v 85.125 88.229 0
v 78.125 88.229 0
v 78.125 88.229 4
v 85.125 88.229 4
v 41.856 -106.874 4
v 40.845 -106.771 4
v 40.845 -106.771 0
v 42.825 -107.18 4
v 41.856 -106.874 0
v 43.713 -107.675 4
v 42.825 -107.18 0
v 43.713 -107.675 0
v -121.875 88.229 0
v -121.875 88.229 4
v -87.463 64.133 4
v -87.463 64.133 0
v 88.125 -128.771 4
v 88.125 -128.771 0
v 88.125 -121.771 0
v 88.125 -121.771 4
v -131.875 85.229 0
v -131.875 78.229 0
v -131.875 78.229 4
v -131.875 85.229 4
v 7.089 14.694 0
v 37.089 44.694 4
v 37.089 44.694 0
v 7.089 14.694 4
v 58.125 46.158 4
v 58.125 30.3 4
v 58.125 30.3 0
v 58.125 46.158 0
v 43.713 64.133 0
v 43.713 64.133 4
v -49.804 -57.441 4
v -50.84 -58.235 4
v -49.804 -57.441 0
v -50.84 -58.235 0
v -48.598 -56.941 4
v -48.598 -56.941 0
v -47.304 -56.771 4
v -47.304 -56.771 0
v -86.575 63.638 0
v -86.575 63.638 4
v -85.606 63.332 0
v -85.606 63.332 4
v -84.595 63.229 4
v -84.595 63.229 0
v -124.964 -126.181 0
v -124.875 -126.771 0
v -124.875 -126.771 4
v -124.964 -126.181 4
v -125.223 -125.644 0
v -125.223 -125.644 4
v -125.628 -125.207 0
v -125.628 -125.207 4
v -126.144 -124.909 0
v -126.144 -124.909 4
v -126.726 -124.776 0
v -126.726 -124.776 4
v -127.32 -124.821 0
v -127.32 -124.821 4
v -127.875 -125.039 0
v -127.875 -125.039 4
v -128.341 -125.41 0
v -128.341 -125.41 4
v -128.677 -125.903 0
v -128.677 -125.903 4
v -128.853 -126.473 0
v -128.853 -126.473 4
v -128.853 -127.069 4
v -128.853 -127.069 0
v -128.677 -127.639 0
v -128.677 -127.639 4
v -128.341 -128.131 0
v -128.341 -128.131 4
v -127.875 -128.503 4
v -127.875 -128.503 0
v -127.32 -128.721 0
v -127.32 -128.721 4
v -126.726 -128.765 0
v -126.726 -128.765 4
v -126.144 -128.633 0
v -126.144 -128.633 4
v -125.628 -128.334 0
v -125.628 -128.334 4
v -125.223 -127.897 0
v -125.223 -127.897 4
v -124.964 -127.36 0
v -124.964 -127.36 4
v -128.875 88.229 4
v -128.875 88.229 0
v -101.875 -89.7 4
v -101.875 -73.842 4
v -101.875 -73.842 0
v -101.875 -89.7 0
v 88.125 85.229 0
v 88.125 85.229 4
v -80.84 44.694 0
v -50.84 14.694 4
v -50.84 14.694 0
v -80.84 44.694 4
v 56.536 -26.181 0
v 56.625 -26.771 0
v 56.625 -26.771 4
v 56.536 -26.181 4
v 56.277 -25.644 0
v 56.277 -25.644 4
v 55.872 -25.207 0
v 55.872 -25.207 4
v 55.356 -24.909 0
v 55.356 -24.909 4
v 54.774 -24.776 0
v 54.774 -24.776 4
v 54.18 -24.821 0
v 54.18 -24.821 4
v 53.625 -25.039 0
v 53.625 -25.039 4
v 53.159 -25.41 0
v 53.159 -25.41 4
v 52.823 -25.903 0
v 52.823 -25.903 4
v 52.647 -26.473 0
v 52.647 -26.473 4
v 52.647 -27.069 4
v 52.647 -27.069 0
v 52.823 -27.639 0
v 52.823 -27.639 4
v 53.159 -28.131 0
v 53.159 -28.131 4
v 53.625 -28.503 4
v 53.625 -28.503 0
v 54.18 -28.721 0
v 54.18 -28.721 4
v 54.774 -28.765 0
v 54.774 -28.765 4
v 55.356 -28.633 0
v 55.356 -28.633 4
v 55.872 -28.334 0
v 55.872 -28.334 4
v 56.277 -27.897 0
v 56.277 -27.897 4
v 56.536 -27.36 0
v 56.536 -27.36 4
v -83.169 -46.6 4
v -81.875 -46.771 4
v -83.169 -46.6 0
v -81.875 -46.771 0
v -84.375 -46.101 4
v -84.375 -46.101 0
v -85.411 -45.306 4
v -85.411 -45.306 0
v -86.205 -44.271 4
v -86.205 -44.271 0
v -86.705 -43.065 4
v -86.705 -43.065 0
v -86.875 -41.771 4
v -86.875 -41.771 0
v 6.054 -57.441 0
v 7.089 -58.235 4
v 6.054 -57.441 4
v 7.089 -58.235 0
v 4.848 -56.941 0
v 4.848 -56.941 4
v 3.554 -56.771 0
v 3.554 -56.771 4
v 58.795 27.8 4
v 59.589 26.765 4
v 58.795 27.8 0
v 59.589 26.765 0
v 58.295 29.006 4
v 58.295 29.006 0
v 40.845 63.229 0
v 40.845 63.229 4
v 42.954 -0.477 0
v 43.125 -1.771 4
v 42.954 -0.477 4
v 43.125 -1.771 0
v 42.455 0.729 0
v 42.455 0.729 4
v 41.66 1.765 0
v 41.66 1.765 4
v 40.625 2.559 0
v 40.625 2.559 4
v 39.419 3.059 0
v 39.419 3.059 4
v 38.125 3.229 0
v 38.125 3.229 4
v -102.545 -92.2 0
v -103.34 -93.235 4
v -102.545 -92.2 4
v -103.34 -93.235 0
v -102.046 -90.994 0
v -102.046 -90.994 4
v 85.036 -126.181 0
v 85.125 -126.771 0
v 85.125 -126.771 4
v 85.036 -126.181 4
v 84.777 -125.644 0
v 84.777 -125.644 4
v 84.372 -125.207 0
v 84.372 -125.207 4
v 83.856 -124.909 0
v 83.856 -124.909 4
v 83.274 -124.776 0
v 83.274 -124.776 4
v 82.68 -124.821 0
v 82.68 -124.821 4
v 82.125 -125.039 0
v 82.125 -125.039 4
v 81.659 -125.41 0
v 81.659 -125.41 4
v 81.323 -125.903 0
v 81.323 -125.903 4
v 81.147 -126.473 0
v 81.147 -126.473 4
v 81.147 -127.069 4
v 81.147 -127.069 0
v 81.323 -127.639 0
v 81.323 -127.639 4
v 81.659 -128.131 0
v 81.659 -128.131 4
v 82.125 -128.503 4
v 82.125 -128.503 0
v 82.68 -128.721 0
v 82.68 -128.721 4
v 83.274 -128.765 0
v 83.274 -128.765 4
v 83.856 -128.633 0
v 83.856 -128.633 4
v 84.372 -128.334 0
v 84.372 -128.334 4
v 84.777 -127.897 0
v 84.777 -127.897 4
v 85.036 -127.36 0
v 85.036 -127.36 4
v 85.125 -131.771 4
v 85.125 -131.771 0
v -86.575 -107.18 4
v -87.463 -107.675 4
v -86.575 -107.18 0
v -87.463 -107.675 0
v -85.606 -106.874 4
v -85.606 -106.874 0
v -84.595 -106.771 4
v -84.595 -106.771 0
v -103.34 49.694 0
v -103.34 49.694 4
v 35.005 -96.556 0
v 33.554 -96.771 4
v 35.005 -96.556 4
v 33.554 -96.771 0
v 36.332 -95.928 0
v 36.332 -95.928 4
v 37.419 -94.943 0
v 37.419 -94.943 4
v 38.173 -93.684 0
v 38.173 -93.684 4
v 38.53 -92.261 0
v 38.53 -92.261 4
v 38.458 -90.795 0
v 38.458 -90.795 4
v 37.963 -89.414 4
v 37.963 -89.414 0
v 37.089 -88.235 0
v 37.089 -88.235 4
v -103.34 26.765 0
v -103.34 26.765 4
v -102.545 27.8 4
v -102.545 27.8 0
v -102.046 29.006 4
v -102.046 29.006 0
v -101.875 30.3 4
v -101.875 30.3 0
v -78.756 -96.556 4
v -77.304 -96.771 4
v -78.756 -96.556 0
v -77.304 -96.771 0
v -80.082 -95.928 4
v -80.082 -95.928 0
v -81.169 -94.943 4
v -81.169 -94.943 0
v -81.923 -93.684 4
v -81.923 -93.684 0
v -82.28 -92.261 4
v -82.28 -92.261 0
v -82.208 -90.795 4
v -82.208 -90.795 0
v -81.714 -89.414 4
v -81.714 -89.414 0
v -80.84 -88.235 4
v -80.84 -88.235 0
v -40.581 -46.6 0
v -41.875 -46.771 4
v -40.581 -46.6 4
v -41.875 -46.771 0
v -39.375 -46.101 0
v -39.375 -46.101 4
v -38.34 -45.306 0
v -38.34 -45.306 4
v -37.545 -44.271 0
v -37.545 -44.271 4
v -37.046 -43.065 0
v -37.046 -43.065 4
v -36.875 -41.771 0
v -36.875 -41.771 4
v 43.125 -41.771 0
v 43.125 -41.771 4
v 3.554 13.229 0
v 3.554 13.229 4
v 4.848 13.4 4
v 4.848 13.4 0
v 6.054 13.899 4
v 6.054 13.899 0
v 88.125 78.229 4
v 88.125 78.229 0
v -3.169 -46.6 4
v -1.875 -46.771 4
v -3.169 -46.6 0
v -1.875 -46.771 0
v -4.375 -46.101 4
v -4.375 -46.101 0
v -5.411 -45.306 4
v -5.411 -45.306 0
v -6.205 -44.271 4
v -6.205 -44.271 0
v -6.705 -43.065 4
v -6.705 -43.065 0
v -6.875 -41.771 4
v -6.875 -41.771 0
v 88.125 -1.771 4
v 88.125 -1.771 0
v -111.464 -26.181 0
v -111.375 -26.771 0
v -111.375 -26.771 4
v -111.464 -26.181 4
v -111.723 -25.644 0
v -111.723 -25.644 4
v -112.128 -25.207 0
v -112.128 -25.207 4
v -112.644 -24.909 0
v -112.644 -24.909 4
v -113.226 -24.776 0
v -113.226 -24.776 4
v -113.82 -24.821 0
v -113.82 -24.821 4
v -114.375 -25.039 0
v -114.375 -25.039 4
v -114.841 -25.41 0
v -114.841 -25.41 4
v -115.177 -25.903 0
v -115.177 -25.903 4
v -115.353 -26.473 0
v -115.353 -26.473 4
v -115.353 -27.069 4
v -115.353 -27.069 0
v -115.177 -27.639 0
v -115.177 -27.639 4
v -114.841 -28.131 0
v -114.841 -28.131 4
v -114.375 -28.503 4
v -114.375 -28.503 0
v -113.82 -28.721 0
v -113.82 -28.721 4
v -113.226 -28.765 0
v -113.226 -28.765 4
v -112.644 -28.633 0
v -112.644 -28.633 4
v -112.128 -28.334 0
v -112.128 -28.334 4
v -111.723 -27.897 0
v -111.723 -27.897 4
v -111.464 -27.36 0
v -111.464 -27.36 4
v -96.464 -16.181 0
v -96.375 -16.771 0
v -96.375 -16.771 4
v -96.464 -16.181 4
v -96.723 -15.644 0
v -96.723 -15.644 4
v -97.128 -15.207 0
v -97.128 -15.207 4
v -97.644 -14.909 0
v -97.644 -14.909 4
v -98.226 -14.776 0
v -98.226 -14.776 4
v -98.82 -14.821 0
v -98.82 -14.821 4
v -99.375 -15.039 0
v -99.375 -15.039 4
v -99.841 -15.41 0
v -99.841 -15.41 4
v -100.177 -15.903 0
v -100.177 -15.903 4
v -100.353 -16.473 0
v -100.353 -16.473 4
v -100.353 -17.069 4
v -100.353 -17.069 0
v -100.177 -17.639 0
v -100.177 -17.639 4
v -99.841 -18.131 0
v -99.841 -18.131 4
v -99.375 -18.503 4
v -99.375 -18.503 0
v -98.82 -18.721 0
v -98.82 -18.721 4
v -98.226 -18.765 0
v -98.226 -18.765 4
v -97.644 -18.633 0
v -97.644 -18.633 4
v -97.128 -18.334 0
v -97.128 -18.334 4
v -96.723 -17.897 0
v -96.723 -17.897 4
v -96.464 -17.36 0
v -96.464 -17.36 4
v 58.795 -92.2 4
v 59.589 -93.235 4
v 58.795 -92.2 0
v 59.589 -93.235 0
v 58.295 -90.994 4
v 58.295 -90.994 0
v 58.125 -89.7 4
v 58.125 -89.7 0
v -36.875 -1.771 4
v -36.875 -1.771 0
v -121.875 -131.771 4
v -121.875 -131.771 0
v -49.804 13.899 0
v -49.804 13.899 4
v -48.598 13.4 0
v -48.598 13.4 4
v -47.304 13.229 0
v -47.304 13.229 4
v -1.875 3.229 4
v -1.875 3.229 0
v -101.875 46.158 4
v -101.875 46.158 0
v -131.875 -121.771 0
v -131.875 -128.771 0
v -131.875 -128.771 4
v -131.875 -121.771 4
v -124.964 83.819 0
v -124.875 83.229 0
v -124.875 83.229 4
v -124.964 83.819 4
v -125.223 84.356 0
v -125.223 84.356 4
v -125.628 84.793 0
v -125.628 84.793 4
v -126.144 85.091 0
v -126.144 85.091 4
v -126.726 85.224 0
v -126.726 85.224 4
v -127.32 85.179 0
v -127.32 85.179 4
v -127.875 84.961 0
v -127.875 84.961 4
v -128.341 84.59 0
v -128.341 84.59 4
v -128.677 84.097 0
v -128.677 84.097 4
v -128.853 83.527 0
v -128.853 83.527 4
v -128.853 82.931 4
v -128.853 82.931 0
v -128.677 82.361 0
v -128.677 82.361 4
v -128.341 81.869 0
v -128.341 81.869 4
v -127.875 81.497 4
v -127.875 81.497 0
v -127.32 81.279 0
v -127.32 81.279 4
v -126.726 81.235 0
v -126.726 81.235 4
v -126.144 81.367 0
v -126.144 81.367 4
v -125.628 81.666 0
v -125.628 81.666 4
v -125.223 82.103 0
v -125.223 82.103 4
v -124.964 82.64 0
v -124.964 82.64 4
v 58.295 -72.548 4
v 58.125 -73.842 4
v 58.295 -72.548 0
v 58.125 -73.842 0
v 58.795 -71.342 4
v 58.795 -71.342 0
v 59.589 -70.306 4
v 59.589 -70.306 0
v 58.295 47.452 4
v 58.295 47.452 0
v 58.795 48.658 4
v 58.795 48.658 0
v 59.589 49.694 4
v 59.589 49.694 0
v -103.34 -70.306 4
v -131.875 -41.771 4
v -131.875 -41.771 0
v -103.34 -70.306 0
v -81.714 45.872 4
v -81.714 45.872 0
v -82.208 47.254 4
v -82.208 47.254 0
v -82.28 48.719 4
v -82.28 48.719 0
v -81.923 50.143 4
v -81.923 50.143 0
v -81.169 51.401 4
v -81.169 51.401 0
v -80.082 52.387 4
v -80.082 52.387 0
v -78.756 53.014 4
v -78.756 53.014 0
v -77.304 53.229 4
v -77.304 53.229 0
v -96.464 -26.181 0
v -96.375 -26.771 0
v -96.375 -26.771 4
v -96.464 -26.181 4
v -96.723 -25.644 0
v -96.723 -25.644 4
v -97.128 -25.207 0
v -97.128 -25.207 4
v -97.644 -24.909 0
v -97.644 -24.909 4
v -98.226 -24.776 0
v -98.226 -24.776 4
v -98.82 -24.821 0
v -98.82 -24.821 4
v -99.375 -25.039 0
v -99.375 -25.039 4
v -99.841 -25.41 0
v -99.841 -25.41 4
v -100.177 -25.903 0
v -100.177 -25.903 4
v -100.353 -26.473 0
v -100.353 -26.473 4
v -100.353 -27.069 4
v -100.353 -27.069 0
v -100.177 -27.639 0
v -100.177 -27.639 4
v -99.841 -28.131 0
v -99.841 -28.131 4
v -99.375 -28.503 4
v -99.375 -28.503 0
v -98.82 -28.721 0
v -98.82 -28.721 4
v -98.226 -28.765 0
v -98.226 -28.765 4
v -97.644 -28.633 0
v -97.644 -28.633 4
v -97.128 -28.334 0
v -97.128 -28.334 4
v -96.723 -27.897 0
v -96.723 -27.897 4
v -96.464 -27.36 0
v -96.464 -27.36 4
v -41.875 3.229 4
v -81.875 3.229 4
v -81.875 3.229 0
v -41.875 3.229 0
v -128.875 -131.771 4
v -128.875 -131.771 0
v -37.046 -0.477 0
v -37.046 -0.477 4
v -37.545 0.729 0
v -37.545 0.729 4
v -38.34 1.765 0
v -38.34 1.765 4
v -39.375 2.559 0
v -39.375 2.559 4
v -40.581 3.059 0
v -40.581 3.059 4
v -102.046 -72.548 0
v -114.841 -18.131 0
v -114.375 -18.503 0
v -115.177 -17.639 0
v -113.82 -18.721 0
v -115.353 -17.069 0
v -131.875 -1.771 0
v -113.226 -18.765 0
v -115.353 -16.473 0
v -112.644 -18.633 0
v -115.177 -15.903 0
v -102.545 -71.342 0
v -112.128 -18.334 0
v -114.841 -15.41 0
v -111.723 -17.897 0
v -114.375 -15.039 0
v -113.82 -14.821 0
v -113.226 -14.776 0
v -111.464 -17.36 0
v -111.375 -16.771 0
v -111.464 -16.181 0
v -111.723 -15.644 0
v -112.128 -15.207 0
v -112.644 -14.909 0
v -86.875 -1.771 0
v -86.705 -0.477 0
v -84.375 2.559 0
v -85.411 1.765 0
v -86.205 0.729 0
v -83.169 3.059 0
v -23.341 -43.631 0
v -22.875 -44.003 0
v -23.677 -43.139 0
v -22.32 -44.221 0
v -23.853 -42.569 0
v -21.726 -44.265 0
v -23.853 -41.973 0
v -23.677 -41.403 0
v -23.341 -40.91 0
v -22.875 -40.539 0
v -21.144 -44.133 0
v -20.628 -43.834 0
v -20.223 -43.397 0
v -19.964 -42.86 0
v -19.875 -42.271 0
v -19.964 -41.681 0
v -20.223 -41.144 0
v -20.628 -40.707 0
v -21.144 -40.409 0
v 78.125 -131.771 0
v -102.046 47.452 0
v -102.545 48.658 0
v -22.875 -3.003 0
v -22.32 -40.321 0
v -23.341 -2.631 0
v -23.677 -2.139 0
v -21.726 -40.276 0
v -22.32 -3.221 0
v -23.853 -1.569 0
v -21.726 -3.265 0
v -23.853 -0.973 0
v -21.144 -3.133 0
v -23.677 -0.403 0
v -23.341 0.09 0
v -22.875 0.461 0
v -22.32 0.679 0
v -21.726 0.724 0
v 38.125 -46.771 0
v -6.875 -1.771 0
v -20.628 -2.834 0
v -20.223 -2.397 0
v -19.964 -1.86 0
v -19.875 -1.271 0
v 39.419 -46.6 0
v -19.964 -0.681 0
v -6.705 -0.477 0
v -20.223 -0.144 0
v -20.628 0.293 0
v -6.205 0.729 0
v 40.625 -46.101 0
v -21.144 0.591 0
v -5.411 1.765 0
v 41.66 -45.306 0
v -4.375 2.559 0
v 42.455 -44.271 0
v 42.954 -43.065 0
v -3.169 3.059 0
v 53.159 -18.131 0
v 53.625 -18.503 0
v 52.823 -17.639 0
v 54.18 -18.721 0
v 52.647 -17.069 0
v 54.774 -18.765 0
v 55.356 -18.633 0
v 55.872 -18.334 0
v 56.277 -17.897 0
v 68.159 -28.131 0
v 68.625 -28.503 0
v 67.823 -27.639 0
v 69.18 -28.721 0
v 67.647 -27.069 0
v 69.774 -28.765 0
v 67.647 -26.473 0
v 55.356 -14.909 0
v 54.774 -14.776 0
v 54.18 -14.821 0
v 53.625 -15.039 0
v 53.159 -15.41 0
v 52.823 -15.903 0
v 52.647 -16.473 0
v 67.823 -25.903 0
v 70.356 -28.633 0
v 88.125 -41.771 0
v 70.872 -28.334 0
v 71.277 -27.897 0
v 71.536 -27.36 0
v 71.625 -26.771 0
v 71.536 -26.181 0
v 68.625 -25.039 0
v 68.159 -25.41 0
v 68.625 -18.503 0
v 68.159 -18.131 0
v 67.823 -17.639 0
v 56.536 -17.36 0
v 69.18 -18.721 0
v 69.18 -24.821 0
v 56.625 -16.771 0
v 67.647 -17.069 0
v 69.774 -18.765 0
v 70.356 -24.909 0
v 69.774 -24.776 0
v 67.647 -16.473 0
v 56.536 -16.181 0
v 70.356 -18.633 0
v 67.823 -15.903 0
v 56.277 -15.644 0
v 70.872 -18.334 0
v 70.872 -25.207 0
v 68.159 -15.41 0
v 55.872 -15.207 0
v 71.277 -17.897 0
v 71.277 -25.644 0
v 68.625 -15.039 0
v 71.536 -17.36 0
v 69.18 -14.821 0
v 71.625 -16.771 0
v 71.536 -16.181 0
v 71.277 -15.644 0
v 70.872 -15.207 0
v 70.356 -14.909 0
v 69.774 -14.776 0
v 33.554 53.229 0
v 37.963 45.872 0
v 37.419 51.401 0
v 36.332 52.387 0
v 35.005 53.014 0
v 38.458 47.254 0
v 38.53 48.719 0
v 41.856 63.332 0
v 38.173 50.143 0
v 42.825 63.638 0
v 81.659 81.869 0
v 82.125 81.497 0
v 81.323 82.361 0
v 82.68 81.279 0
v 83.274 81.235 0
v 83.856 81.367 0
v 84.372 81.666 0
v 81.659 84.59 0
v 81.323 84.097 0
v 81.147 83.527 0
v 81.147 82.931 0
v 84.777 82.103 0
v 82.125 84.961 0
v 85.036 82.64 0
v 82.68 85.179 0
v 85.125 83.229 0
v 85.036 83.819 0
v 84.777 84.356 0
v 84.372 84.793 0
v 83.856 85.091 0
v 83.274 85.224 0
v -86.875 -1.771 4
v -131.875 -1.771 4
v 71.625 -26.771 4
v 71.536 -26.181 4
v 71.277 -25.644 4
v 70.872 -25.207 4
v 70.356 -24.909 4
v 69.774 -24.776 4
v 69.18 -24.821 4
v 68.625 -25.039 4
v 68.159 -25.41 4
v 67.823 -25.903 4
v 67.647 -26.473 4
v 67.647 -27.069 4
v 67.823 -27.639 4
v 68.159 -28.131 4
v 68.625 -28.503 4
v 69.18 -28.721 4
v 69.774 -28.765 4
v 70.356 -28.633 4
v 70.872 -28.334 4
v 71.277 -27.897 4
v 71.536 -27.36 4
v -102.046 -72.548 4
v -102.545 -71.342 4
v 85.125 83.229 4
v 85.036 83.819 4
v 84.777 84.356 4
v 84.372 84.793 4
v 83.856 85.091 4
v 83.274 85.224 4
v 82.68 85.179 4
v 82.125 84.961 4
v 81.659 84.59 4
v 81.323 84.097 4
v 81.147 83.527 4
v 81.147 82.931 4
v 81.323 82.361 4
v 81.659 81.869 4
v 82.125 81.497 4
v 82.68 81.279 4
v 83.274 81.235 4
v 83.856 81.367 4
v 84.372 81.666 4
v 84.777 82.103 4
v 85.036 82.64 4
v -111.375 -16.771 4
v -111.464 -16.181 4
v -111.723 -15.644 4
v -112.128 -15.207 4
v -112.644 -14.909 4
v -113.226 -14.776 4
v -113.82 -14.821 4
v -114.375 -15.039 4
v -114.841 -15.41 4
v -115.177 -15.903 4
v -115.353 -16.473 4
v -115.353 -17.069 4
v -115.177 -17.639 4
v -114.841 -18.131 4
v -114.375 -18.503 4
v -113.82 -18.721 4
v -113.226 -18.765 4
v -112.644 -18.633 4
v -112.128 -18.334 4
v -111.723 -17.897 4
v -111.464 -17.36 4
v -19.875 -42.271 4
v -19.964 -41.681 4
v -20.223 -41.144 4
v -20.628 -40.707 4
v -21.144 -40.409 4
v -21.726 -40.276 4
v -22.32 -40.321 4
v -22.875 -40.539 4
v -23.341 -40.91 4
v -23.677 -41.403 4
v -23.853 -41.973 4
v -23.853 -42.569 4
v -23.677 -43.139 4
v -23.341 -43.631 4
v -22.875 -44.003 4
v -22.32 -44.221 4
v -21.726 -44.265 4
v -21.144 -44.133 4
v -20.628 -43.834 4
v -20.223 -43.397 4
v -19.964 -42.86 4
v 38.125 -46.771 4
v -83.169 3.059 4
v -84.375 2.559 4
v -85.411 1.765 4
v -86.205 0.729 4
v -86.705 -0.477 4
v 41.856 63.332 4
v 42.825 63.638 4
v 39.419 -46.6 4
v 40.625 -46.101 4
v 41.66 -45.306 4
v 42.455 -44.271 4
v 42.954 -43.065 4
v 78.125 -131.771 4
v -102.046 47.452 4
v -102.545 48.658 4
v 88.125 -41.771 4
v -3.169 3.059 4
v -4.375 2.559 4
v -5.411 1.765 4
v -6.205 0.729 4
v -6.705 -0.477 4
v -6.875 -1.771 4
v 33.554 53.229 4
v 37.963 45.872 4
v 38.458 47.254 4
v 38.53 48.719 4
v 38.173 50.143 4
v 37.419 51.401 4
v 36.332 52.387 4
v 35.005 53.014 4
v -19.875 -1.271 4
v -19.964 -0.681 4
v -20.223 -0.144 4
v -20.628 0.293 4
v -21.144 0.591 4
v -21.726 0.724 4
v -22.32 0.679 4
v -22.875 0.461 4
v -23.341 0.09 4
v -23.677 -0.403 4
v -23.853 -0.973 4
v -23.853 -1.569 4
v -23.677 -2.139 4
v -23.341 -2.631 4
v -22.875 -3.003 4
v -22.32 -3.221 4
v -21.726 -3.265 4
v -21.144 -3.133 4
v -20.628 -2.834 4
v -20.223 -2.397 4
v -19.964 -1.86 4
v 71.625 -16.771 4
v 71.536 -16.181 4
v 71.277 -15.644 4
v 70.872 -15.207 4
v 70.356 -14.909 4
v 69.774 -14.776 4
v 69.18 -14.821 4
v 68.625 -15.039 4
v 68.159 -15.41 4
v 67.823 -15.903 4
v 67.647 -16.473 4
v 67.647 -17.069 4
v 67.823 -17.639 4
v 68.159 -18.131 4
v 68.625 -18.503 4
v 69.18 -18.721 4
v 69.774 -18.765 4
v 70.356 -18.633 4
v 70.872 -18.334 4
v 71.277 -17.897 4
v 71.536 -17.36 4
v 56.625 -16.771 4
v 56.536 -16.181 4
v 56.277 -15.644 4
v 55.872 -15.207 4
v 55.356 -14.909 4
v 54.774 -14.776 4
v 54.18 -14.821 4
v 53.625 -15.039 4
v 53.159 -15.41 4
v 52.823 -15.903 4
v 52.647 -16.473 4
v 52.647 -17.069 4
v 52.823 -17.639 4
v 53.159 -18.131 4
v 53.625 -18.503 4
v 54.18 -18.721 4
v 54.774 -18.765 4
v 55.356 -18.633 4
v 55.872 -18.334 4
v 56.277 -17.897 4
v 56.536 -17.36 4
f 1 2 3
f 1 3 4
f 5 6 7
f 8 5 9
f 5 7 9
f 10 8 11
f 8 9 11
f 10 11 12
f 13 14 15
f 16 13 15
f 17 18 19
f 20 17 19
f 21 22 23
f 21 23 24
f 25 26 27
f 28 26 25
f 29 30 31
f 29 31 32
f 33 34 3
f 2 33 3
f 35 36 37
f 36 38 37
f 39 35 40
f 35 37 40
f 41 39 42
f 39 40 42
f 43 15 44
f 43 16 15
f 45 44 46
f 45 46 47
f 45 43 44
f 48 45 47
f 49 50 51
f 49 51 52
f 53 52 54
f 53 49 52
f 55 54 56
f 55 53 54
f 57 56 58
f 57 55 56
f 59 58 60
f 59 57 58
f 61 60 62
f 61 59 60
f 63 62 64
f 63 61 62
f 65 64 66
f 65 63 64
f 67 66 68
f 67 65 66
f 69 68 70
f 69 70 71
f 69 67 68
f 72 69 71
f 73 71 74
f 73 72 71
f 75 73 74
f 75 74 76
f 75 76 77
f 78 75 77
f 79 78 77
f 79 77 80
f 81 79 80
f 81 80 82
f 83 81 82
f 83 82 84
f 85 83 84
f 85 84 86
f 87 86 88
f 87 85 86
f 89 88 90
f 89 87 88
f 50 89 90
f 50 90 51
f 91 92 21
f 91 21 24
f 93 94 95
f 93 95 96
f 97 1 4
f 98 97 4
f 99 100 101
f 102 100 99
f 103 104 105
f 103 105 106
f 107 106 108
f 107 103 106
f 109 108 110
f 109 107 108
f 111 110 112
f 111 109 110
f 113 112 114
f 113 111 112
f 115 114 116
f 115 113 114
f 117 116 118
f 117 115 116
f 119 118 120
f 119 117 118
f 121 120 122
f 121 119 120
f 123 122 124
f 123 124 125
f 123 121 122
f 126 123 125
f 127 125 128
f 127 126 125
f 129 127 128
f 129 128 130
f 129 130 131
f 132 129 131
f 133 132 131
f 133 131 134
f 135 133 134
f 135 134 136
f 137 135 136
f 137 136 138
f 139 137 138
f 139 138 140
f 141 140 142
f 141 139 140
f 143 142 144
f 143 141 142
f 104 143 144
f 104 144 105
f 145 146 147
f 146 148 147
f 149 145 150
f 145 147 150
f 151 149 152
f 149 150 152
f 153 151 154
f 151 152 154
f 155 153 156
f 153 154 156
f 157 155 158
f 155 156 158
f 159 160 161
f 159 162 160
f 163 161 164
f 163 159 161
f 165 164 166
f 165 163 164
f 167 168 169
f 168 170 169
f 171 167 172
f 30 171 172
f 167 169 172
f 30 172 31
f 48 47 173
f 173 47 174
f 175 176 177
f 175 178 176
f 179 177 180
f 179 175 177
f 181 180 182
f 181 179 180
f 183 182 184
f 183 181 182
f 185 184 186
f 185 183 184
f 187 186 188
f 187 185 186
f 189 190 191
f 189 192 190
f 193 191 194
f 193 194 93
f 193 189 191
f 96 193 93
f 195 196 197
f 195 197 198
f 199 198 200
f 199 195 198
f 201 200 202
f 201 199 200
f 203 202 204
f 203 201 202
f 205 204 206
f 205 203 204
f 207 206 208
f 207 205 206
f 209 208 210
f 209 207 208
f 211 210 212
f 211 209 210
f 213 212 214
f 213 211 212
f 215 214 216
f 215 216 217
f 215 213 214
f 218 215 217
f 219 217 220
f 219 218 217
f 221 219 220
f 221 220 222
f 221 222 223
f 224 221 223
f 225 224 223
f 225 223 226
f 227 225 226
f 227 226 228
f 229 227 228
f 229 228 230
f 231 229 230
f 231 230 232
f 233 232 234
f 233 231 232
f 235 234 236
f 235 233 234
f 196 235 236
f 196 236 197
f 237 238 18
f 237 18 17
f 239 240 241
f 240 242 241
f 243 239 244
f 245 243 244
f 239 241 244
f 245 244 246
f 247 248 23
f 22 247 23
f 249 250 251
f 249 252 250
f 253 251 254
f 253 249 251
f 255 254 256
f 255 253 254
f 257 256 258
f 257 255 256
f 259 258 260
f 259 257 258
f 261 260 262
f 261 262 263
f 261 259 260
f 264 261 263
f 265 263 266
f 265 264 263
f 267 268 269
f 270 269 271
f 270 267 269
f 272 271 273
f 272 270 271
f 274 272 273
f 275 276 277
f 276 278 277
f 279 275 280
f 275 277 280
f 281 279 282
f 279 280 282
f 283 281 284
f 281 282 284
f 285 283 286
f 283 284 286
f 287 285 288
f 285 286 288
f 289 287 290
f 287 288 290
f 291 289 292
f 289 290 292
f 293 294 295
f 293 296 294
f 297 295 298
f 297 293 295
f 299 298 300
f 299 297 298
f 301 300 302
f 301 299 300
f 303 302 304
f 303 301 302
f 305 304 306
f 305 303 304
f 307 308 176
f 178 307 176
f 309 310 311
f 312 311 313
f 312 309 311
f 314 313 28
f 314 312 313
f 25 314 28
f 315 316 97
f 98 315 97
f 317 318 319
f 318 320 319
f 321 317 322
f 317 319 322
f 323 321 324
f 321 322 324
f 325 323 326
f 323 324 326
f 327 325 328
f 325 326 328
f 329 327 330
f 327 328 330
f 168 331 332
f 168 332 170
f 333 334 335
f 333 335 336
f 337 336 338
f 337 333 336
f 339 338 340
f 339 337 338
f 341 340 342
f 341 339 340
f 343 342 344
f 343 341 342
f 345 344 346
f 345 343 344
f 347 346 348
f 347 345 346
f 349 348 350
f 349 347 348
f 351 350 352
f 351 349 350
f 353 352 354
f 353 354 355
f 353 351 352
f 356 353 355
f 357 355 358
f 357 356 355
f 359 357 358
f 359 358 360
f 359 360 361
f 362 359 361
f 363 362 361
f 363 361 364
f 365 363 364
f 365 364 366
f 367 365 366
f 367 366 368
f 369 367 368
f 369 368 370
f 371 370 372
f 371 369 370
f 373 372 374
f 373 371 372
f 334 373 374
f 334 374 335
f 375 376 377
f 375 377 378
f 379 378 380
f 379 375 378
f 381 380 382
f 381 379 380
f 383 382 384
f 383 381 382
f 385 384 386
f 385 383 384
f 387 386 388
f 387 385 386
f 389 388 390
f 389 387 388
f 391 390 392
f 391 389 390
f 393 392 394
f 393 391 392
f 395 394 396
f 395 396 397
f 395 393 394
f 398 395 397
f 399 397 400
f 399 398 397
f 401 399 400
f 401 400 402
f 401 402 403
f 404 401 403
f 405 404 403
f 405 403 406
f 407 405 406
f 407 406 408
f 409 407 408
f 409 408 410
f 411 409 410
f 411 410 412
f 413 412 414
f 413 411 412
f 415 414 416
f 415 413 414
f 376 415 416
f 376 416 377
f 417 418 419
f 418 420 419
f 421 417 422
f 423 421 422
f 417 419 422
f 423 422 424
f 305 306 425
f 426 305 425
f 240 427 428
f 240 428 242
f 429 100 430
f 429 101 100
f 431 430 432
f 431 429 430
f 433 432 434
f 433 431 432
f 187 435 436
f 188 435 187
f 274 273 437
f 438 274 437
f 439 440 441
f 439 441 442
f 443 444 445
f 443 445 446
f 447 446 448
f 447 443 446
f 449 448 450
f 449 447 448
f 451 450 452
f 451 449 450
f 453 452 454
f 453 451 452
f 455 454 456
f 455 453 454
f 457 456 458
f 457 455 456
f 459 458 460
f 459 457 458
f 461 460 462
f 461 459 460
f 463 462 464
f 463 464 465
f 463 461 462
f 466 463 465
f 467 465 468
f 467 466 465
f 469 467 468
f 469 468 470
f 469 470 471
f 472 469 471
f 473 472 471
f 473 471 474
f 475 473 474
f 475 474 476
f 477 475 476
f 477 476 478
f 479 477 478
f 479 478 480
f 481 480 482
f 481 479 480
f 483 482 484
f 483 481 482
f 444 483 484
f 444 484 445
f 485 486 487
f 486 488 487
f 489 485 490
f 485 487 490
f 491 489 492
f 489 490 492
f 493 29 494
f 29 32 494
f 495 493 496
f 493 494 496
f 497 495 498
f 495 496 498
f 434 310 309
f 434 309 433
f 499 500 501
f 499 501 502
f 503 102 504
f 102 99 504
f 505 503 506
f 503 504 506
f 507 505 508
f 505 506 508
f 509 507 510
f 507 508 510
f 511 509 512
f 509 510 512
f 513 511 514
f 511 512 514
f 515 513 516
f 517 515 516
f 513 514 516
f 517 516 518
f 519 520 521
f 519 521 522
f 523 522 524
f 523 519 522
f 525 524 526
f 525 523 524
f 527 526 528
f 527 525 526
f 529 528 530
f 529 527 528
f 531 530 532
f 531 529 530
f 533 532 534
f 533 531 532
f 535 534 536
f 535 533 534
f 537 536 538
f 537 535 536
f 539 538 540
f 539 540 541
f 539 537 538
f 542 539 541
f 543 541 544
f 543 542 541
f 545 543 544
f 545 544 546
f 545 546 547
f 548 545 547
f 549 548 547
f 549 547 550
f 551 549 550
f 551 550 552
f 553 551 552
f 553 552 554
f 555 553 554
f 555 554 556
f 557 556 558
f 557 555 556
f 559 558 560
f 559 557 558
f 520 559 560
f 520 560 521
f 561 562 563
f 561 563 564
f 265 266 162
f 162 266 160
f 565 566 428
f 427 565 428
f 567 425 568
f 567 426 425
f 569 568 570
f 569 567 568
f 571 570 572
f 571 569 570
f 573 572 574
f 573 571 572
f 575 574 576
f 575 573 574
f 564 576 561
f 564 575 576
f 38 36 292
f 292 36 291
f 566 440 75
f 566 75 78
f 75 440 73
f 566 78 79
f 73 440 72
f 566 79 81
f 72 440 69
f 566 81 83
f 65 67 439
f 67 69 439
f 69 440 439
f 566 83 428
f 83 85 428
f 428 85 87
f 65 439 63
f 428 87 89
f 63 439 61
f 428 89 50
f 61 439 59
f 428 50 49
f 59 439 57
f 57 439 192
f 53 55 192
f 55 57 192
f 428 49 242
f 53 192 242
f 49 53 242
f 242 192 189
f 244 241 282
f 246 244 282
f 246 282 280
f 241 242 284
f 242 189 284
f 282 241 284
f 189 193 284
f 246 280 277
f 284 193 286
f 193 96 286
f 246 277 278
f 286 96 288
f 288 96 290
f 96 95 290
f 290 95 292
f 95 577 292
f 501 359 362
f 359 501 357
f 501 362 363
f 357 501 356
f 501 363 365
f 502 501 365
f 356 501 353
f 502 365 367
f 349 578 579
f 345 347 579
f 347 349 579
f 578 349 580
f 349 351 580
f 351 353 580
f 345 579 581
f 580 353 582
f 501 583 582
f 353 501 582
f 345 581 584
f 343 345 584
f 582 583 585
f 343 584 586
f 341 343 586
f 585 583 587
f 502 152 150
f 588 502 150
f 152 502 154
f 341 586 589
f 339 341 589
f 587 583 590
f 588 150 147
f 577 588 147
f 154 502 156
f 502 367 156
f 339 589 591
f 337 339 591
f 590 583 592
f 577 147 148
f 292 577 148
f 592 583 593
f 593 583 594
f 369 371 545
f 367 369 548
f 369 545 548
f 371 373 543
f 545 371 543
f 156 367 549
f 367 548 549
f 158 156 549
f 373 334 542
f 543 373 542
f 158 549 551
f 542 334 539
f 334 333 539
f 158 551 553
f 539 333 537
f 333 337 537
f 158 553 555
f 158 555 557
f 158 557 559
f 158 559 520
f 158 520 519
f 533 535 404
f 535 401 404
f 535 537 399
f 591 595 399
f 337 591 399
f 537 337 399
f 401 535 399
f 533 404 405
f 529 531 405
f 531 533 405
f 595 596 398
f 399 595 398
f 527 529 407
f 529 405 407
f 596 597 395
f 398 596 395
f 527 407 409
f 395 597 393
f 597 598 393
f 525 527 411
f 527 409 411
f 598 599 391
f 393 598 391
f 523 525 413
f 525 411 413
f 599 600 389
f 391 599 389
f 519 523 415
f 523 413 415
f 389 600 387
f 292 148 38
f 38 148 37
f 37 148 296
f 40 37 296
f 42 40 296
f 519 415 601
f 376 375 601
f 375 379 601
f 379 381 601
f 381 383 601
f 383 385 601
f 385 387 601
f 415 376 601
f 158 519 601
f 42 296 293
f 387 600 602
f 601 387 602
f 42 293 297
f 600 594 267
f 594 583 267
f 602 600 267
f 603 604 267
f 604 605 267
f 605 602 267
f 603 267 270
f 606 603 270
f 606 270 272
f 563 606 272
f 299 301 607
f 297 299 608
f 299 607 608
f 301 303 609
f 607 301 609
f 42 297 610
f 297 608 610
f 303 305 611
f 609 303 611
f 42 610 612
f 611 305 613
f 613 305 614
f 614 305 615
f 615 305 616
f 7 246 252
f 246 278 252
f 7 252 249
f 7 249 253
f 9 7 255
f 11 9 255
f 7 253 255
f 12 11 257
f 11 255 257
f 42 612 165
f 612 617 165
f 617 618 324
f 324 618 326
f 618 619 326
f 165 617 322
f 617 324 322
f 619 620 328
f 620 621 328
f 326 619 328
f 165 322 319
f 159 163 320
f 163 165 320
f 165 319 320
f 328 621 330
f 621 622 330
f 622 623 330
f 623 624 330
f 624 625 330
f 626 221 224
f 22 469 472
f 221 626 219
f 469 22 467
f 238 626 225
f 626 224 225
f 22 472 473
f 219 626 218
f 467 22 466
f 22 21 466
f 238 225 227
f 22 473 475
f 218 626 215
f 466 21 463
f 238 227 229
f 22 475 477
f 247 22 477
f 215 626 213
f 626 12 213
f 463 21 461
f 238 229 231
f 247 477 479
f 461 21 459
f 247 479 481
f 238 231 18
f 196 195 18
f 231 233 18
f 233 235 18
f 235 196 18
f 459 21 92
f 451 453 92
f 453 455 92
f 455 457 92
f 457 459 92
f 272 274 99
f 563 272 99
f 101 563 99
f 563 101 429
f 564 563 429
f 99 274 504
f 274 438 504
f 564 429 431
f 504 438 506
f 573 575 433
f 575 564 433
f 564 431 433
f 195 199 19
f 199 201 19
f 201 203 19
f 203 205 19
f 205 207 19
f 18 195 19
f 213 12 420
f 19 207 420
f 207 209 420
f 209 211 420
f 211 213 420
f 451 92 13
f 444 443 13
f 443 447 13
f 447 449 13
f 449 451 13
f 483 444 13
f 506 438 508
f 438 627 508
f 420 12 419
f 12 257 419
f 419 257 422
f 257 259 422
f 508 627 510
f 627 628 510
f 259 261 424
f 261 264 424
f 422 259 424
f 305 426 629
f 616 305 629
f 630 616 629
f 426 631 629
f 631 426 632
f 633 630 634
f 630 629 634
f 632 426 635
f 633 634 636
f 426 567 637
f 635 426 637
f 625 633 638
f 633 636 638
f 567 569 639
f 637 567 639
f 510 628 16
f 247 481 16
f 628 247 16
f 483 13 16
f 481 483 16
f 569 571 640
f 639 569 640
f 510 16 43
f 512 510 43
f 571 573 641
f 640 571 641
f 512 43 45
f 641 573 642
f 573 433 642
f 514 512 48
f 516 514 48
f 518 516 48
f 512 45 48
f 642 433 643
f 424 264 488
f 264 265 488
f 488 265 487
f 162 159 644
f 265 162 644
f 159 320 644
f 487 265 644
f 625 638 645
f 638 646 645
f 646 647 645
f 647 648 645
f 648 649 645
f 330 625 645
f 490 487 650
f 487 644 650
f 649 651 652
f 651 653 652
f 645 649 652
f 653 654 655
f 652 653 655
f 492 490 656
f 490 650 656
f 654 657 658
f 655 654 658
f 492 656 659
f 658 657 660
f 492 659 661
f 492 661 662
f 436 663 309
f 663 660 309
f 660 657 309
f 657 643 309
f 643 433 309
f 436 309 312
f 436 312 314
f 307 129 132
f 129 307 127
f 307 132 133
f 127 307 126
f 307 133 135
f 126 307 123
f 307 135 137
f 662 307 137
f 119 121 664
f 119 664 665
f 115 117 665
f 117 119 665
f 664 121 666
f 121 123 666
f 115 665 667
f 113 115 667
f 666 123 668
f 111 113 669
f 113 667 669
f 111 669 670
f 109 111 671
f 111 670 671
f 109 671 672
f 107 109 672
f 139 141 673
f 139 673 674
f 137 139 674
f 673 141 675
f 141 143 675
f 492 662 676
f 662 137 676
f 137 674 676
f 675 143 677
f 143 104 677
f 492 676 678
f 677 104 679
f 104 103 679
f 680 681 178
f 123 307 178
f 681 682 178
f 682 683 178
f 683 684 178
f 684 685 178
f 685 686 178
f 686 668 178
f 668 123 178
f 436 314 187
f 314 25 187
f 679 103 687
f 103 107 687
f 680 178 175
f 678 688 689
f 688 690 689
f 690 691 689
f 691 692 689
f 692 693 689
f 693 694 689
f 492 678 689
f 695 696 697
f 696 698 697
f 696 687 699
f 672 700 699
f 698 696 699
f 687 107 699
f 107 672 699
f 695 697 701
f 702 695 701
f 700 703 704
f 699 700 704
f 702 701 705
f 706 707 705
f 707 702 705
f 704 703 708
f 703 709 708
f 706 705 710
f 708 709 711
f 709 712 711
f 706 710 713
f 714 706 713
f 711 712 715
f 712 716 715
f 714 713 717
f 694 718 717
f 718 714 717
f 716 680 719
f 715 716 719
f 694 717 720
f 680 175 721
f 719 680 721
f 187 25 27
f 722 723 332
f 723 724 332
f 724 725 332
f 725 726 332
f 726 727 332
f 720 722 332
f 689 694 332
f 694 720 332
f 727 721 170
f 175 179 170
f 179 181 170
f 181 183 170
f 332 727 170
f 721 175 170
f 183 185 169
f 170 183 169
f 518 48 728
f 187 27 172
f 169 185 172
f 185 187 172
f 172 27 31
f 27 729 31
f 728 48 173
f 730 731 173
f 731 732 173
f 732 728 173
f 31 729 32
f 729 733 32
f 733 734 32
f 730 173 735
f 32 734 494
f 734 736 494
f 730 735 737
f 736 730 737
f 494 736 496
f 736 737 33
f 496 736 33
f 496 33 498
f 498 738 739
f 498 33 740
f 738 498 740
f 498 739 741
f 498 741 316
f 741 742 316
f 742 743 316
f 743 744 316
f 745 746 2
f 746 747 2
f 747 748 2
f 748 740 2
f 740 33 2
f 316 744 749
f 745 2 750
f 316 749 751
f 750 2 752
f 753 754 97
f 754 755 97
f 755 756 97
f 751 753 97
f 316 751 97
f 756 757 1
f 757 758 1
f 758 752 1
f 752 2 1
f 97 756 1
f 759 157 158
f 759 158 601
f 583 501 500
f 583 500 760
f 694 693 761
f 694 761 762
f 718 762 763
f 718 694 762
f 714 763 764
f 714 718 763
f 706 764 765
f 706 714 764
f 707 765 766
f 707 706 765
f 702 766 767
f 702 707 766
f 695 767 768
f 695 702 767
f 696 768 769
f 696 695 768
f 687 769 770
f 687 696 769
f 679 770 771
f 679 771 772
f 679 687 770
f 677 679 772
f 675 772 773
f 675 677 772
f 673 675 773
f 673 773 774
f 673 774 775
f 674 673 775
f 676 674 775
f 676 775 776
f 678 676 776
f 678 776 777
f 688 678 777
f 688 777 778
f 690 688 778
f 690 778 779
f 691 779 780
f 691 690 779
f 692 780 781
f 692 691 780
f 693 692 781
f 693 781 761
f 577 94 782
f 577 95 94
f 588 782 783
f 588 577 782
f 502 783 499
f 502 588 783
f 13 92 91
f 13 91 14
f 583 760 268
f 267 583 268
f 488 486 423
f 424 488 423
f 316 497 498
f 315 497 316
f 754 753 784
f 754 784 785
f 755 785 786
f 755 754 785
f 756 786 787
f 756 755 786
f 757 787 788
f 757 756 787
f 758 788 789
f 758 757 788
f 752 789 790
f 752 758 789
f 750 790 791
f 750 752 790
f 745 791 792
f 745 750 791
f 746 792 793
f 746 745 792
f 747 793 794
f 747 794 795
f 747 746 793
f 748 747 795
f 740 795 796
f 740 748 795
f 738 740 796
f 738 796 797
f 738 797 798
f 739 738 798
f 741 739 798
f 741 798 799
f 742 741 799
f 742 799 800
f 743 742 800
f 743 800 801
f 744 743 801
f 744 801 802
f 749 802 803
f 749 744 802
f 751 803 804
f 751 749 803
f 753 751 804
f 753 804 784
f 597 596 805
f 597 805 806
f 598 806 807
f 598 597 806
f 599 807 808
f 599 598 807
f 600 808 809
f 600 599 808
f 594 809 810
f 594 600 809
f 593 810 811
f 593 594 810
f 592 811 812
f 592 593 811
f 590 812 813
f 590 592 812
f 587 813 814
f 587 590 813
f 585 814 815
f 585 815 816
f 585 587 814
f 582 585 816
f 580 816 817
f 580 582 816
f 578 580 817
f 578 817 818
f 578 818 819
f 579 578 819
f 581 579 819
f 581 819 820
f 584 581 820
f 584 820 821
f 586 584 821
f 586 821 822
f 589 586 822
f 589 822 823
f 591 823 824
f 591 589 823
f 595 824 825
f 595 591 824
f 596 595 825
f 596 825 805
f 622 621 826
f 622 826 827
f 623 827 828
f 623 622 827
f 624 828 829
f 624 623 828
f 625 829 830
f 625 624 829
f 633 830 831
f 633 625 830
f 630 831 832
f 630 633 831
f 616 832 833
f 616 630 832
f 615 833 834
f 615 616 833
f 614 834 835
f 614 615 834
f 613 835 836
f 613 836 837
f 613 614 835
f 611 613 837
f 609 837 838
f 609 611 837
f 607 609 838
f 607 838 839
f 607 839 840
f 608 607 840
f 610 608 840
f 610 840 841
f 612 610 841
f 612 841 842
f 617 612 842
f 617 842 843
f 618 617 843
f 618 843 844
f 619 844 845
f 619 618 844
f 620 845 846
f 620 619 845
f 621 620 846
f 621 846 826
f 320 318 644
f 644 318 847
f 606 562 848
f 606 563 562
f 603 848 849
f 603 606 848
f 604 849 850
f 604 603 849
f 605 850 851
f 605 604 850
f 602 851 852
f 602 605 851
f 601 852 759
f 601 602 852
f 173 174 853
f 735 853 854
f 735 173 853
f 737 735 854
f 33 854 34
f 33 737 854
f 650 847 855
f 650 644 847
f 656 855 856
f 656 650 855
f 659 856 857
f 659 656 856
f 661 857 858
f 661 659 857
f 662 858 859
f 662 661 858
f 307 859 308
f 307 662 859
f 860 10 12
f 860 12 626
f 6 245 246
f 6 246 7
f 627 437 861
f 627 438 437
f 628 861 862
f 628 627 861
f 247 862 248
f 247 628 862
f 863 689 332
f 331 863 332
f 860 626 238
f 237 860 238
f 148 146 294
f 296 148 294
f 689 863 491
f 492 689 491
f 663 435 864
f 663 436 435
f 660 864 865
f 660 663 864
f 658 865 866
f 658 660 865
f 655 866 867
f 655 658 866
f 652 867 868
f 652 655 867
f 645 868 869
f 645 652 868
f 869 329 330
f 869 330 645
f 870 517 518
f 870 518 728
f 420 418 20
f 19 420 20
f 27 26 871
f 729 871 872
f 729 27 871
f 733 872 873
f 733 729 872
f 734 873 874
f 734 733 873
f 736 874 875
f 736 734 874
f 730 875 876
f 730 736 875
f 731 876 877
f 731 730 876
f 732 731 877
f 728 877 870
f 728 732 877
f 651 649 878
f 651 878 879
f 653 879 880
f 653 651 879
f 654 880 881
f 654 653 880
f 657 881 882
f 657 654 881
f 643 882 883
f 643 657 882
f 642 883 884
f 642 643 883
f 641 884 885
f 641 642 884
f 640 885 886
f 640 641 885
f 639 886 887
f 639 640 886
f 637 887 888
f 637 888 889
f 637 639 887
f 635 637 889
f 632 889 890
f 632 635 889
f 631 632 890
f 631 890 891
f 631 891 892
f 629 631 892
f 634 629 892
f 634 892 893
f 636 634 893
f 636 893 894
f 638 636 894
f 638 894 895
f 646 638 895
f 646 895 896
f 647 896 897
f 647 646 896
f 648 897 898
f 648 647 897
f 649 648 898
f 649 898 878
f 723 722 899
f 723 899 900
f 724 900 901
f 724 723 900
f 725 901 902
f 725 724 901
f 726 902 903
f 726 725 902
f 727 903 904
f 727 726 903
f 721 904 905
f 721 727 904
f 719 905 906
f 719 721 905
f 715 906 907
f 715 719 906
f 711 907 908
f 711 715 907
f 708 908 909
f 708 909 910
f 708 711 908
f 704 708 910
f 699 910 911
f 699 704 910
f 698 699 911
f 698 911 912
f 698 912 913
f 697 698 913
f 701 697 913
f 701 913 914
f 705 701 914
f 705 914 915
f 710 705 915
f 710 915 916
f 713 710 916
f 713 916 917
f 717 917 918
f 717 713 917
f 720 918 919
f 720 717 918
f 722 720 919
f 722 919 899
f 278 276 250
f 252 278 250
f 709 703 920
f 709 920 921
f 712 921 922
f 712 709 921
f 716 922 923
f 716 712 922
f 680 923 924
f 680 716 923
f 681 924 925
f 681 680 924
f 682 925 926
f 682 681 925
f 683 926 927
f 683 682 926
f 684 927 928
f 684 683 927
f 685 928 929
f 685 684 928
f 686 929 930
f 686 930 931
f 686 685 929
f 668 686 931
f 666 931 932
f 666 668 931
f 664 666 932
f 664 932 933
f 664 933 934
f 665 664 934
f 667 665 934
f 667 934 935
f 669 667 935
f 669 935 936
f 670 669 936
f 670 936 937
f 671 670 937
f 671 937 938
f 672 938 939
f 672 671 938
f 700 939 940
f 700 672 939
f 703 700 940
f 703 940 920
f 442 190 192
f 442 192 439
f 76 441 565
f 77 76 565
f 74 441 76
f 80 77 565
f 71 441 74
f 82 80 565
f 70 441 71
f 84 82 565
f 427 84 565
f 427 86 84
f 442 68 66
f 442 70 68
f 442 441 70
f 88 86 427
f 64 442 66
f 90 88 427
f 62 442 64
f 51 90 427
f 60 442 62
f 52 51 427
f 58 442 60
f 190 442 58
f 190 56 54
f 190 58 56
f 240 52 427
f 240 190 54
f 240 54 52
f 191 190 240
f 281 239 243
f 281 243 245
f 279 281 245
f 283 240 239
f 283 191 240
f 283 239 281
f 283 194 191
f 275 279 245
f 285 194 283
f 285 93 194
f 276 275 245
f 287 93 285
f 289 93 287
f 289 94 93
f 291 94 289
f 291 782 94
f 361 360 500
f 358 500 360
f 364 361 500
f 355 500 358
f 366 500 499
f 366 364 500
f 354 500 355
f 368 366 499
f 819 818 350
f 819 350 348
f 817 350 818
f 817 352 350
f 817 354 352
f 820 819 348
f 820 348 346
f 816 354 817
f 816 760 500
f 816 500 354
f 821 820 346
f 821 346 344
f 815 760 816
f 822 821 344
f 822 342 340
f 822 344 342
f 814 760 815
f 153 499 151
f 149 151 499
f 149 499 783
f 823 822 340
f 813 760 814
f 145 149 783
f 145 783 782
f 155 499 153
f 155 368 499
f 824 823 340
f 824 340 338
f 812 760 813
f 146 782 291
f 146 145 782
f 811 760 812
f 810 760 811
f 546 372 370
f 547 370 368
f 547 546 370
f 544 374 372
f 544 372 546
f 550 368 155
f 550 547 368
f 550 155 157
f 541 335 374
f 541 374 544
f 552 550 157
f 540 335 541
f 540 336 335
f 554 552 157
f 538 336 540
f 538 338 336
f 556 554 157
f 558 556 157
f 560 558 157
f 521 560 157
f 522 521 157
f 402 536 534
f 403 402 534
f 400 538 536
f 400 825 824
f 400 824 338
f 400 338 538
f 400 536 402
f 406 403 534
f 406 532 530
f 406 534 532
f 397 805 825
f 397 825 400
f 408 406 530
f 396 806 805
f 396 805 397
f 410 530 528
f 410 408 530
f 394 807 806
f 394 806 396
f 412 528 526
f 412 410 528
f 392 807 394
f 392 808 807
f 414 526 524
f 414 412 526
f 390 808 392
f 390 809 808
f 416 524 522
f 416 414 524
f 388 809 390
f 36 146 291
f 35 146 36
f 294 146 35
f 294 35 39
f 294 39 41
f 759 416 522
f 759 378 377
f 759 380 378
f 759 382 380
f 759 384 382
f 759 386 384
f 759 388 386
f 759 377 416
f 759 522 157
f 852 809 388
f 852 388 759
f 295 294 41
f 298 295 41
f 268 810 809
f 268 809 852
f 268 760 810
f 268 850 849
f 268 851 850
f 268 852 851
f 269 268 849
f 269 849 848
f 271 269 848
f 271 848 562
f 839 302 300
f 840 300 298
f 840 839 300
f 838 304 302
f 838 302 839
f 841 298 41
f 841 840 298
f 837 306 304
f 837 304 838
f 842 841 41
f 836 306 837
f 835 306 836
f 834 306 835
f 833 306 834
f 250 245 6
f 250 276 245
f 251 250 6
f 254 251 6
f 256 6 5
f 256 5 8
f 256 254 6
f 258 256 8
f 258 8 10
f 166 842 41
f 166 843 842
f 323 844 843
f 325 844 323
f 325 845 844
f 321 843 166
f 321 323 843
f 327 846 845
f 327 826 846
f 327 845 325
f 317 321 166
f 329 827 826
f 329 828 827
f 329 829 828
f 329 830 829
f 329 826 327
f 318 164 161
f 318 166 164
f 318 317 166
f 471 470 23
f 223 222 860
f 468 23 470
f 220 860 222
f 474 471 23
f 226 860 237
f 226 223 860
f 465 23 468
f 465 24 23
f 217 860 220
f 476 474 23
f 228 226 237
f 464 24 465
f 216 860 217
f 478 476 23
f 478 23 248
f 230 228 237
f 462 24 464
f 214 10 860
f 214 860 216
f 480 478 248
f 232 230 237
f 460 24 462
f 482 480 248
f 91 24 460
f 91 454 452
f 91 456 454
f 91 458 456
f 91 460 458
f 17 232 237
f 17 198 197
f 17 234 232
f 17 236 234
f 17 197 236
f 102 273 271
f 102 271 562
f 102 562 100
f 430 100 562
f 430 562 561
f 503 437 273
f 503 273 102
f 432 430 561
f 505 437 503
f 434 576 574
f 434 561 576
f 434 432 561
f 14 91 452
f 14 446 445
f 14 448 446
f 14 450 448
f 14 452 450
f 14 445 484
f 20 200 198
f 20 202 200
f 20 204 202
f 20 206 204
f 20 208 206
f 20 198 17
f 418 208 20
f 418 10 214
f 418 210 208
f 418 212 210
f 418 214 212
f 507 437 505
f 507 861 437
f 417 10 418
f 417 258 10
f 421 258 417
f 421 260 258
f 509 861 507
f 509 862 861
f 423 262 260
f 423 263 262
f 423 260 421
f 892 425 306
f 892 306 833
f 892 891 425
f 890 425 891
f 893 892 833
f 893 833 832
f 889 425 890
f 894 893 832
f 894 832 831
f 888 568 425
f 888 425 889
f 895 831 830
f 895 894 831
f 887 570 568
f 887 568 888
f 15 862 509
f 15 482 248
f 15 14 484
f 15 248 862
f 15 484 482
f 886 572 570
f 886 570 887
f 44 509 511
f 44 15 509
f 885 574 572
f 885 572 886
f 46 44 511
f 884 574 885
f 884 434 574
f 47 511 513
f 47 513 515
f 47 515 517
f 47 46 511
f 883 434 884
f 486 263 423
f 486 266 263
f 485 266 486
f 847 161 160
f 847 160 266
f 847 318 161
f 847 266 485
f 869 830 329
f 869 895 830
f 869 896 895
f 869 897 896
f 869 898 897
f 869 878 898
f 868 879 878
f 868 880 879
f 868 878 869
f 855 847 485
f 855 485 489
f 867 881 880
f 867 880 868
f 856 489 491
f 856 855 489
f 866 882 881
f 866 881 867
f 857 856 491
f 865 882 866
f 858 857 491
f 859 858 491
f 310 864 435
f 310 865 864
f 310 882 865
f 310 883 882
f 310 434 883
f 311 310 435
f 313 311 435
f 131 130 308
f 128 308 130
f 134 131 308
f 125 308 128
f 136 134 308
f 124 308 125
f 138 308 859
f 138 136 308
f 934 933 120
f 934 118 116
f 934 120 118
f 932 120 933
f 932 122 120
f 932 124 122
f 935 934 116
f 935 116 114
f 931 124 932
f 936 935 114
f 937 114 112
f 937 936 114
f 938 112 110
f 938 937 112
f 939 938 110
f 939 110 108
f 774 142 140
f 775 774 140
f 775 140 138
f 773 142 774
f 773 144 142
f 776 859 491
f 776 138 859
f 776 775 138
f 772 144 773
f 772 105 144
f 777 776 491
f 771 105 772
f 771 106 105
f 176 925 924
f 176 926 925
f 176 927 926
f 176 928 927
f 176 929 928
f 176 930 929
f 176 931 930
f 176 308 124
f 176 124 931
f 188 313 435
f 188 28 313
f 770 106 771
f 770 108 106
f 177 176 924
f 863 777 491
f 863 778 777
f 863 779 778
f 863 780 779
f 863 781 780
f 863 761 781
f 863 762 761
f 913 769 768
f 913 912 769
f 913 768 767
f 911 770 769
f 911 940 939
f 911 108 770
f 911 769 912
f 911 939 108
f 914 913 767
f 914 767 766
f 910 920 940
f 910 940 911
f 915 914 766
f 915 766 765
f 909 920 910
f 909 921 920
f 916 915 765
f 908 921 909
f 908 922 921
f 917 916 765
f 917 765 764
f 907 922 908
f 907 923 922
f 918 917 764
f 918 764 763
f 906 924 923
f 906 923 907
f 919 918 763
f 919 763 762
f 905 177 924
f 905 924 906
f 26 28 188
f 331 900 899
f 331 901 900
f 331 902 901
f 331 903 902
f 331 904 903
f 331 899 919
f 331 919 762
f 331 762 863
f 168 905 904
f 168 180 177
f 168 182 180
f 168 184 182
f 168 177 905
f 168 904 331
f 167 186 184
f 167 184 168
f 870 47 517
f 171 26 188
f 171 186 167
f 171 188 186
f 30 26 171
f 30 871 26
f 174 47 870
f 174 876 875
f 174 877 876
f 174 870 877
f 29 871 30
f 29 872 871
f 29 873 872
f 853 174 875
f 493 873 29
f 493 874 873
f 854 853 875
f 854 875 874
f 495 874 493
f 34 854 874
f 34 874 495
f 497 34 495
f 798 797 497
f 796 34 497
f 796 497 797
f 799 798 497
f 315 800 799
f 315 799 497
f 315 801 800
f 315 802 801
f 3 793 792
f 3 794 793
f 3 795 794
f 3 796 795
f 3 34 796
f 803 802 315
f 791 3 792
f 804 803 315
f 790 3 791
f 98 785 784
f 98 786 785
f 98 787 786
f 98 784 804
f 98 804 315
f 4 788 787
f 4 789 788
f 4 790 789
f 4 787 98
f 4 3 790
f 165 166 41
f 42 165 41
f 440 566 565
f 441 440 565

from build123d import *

# Parameters (mm, degrees)
ESQUISSE1_W             = 220
ESQUISSE1_H             = 220
ESQUISSE1_R             = 2
BOSS_EXTRU_1_DEPTH      = 4
ESQUISSE2_W             = 50
ESQUISSE2_H             = 50
ENL_V_MAT_EXTRU_1_DEPTH = 5
CONG_1_R                = 5
CHANFREIN1_SIZE         = 3
CONG_2_R                = 5


with BuildPart() as part:
    # Esquisse1 → Boss.-Extru.1 (new body)
    with BuildSketch(Plane.XY):
        with Locations((-21.875157945, -21.770833333)):
            Rectangle(ESQUISSE1_W, ESQUISSE1_H)
        with Locations((-126.875157945, 83.229166667)):
            Circle(ESQUISSE1_R, mode=Mode.SUBTRACT)
        with Locations((83.124842055, 83.229166667)):
            Circle(ESQUISSE1_R, mode=Mode.SUBTRACT)
        with Locations((-126.875157945, -126.770833333)):
            Circle(ESQUISSE1_R, mode=Mode.SUBTRACT)
        with Locations((83.124842055, -126.770833333)):
            Circle(ESQUISSE1_R, mode=Mode.SUBTRACT)
        with Locations((-113.375157945, -16.770833333)):
            Circle(ESQUISSE1_R, mode=Mode.SUBTRACT)
        with Locations((-98.375157945, -16.770833333)):
            Circle(ESQUISSE1_R, mode=Mode.SUBTRACT)
        with Locations((-113.375157945, -26.770833333)):
            Circle(ESQUISSE1_R, mode=Mode.SUBTRACT)
        with Locations((-98.375157945, -26.770833333)):
            Circle(ESQUISSE1_R, mode=Mode.SUBTRACT)
        with Locations((54.624842055, -16.770833333)):
            Circle(ESQUISSE1_R, mode=Mode.SUBTRACT)
        with Locations((69.624842055, -16.770833333)):
            Circle(ESQUISSE1_R, mode=Mode.SUBTRACT)
        with Locations((54.624842055, -26.770833333)):
            Circle(ESQUISSE1_R, mode=Mode.SUBTRACT)
        with Locations((69.624842055, -26.770833333)):
            Circle(ESQUISSE1_R, mode=Mode.SUBTRACT)
        with Locations((-21.875157945, -1.270833333)):
            Circle(ESQUISSE1_R, mode=Mode.SUBTRACT)
        with Locations((-21.875157945, -42.270833333)):
            Circle(ESQUISSE1_R, mode=Mode.SUBTRACT)
    extrude(amount=BOSS_EXTRU_1_DEPTH)

    # Esquisse2 → Enlèv. mat.-Extru.1 (cut, through all)
    with BuildSketch(Plane.XY.offset(4)):
        Polygon((-89.375157945, 53.229166667), (45.624842055, 53.229166667), (5.624842055, 13.229166667), (-49.375157945, 13.229166667), align=None)
        Polygon((-89.375157945, -96.770833333), (45.624842055, -96.770833333), (5.624842055, -56.770833333), (-49.375157945, -56.770833333), align=None)
        Polygon((88.124842055, -41.770833333), (58.124842055, -71.770833333), (58.124842055, -91.770833333), (88.124842055, -121.770833333), align=None)
        Polygon((88.124842055, 78.229166667), (88.124842055, -1.770833333), (58.124842055, 28.229166667), (58.124842055, 48.229166667), align=None)
        Polygon((-131.875157945, 78.229166667), (-131.875157945, -1.770833333), (-101.875157945, 28.229166667), (-101.875157945, 48.229166667), align=None)
        Polygon((-131.875157945, -41.770833333), (-101.875157945, -71.770833333), (-101.875157945, -91.770833333), (-131.875157945, -121.770833333), align=None)
        with Locations((18.124842055, -21.770833333)):
            Rectangle(ESQUISSE2_W, ESQUISSE2_H)
        with Locations((-61.875157945, -21.770833333)):
            Rectangle(ESQUISSE2_W, ESQUISSE2_H)
        Polygon((-121.875157945, -131.770833333), (-86.171457776, -106.770833333), (42.421141887, -106.770833333), (78.124842055, -131.770833333), align=None)
        Polygon((-121.875157945, 88.229166667), (-86.171457776, 63.229166667), (42.421141887, 63.229166667), (78.124842055, 88.229166667), align=None)
    extrude(amount=-ENL_V_MAT_EXTRU_1_DEPTH, mode=Mode.SUBTRACT)

    # Congé1
    cong_1_edges = [part.edges().sort_by_distance(p)[0] for p in [
        (-89.375157945, 53.229166667, 2),
        (45.624842055, 53.229166667, 2),
        (-89.375157945, -96.770833333, 2),
        (45.624842055, -96.770833333, 2),
    ]]
    fillet(cong_1_edges, radius=CONG_1_R)

    # Chanfrein1
    chanfrein1_edges = [part.edges().sort_by_distance(p)[0] for p in [
        (-131.875157945, 88.229166667, 2),
        (88.124842055, 88.229166667, 2),
        (88.124842055, -131.770833333, 2),
        (-131.875157945, -131.770833333, 2),
    ]]
    chamfer(chanfrein1_edges, length=CHANFREIN1_SIZE)

    # Congé2
    cong_2_edges = [part.edges().sort_by_distance(p)[0] for p in [
        (58.124842055, -91.770833333, 2),
        (58.124842055, -71.770833333, 2),
        (58.124842055, 48.229166667, 2),
        (58.124842055, 28.229166667, 2),
        (-101.875157945, 48.229166667, 2),
        (-101.875157945, 28.229166667, 2),
        (-101.875157945, -71.770833333, 2),
        (-101.875157945, -91.770833333, 2),
        (-86.875157945, -46.770833333, 2),
        (-86.875157945, 3.229166667, 2),
        (-36.875157945, 3.229166667, 2),
        (-36.875157945, -46.770833333, 2),
        (-6.875157945, -46.770833333, 2),
        (-6.875157945, 3.229166667, 2),
        (43.124842055, 3.229166667, 2),
        (43.124842055, -46.770833333, 2),
        (-86.171457776, -106.770833333, 2),
        (42.421141887, -106.770833333, 2),
        (42.421141887, 63.229166667, 2),
        (-86.171457776, 63.229166667, 2),
        (-49.375157945, 13.229166667, 2),
        (5.624842055, 13.229166667, 2),
        (-49.375157945, -56.770833333, 2),
        (5.624842055, -56.770833333, 2),
    ]]
    fillet(cong_2_edges, radius=CONG_2_R)


solid = part.part
